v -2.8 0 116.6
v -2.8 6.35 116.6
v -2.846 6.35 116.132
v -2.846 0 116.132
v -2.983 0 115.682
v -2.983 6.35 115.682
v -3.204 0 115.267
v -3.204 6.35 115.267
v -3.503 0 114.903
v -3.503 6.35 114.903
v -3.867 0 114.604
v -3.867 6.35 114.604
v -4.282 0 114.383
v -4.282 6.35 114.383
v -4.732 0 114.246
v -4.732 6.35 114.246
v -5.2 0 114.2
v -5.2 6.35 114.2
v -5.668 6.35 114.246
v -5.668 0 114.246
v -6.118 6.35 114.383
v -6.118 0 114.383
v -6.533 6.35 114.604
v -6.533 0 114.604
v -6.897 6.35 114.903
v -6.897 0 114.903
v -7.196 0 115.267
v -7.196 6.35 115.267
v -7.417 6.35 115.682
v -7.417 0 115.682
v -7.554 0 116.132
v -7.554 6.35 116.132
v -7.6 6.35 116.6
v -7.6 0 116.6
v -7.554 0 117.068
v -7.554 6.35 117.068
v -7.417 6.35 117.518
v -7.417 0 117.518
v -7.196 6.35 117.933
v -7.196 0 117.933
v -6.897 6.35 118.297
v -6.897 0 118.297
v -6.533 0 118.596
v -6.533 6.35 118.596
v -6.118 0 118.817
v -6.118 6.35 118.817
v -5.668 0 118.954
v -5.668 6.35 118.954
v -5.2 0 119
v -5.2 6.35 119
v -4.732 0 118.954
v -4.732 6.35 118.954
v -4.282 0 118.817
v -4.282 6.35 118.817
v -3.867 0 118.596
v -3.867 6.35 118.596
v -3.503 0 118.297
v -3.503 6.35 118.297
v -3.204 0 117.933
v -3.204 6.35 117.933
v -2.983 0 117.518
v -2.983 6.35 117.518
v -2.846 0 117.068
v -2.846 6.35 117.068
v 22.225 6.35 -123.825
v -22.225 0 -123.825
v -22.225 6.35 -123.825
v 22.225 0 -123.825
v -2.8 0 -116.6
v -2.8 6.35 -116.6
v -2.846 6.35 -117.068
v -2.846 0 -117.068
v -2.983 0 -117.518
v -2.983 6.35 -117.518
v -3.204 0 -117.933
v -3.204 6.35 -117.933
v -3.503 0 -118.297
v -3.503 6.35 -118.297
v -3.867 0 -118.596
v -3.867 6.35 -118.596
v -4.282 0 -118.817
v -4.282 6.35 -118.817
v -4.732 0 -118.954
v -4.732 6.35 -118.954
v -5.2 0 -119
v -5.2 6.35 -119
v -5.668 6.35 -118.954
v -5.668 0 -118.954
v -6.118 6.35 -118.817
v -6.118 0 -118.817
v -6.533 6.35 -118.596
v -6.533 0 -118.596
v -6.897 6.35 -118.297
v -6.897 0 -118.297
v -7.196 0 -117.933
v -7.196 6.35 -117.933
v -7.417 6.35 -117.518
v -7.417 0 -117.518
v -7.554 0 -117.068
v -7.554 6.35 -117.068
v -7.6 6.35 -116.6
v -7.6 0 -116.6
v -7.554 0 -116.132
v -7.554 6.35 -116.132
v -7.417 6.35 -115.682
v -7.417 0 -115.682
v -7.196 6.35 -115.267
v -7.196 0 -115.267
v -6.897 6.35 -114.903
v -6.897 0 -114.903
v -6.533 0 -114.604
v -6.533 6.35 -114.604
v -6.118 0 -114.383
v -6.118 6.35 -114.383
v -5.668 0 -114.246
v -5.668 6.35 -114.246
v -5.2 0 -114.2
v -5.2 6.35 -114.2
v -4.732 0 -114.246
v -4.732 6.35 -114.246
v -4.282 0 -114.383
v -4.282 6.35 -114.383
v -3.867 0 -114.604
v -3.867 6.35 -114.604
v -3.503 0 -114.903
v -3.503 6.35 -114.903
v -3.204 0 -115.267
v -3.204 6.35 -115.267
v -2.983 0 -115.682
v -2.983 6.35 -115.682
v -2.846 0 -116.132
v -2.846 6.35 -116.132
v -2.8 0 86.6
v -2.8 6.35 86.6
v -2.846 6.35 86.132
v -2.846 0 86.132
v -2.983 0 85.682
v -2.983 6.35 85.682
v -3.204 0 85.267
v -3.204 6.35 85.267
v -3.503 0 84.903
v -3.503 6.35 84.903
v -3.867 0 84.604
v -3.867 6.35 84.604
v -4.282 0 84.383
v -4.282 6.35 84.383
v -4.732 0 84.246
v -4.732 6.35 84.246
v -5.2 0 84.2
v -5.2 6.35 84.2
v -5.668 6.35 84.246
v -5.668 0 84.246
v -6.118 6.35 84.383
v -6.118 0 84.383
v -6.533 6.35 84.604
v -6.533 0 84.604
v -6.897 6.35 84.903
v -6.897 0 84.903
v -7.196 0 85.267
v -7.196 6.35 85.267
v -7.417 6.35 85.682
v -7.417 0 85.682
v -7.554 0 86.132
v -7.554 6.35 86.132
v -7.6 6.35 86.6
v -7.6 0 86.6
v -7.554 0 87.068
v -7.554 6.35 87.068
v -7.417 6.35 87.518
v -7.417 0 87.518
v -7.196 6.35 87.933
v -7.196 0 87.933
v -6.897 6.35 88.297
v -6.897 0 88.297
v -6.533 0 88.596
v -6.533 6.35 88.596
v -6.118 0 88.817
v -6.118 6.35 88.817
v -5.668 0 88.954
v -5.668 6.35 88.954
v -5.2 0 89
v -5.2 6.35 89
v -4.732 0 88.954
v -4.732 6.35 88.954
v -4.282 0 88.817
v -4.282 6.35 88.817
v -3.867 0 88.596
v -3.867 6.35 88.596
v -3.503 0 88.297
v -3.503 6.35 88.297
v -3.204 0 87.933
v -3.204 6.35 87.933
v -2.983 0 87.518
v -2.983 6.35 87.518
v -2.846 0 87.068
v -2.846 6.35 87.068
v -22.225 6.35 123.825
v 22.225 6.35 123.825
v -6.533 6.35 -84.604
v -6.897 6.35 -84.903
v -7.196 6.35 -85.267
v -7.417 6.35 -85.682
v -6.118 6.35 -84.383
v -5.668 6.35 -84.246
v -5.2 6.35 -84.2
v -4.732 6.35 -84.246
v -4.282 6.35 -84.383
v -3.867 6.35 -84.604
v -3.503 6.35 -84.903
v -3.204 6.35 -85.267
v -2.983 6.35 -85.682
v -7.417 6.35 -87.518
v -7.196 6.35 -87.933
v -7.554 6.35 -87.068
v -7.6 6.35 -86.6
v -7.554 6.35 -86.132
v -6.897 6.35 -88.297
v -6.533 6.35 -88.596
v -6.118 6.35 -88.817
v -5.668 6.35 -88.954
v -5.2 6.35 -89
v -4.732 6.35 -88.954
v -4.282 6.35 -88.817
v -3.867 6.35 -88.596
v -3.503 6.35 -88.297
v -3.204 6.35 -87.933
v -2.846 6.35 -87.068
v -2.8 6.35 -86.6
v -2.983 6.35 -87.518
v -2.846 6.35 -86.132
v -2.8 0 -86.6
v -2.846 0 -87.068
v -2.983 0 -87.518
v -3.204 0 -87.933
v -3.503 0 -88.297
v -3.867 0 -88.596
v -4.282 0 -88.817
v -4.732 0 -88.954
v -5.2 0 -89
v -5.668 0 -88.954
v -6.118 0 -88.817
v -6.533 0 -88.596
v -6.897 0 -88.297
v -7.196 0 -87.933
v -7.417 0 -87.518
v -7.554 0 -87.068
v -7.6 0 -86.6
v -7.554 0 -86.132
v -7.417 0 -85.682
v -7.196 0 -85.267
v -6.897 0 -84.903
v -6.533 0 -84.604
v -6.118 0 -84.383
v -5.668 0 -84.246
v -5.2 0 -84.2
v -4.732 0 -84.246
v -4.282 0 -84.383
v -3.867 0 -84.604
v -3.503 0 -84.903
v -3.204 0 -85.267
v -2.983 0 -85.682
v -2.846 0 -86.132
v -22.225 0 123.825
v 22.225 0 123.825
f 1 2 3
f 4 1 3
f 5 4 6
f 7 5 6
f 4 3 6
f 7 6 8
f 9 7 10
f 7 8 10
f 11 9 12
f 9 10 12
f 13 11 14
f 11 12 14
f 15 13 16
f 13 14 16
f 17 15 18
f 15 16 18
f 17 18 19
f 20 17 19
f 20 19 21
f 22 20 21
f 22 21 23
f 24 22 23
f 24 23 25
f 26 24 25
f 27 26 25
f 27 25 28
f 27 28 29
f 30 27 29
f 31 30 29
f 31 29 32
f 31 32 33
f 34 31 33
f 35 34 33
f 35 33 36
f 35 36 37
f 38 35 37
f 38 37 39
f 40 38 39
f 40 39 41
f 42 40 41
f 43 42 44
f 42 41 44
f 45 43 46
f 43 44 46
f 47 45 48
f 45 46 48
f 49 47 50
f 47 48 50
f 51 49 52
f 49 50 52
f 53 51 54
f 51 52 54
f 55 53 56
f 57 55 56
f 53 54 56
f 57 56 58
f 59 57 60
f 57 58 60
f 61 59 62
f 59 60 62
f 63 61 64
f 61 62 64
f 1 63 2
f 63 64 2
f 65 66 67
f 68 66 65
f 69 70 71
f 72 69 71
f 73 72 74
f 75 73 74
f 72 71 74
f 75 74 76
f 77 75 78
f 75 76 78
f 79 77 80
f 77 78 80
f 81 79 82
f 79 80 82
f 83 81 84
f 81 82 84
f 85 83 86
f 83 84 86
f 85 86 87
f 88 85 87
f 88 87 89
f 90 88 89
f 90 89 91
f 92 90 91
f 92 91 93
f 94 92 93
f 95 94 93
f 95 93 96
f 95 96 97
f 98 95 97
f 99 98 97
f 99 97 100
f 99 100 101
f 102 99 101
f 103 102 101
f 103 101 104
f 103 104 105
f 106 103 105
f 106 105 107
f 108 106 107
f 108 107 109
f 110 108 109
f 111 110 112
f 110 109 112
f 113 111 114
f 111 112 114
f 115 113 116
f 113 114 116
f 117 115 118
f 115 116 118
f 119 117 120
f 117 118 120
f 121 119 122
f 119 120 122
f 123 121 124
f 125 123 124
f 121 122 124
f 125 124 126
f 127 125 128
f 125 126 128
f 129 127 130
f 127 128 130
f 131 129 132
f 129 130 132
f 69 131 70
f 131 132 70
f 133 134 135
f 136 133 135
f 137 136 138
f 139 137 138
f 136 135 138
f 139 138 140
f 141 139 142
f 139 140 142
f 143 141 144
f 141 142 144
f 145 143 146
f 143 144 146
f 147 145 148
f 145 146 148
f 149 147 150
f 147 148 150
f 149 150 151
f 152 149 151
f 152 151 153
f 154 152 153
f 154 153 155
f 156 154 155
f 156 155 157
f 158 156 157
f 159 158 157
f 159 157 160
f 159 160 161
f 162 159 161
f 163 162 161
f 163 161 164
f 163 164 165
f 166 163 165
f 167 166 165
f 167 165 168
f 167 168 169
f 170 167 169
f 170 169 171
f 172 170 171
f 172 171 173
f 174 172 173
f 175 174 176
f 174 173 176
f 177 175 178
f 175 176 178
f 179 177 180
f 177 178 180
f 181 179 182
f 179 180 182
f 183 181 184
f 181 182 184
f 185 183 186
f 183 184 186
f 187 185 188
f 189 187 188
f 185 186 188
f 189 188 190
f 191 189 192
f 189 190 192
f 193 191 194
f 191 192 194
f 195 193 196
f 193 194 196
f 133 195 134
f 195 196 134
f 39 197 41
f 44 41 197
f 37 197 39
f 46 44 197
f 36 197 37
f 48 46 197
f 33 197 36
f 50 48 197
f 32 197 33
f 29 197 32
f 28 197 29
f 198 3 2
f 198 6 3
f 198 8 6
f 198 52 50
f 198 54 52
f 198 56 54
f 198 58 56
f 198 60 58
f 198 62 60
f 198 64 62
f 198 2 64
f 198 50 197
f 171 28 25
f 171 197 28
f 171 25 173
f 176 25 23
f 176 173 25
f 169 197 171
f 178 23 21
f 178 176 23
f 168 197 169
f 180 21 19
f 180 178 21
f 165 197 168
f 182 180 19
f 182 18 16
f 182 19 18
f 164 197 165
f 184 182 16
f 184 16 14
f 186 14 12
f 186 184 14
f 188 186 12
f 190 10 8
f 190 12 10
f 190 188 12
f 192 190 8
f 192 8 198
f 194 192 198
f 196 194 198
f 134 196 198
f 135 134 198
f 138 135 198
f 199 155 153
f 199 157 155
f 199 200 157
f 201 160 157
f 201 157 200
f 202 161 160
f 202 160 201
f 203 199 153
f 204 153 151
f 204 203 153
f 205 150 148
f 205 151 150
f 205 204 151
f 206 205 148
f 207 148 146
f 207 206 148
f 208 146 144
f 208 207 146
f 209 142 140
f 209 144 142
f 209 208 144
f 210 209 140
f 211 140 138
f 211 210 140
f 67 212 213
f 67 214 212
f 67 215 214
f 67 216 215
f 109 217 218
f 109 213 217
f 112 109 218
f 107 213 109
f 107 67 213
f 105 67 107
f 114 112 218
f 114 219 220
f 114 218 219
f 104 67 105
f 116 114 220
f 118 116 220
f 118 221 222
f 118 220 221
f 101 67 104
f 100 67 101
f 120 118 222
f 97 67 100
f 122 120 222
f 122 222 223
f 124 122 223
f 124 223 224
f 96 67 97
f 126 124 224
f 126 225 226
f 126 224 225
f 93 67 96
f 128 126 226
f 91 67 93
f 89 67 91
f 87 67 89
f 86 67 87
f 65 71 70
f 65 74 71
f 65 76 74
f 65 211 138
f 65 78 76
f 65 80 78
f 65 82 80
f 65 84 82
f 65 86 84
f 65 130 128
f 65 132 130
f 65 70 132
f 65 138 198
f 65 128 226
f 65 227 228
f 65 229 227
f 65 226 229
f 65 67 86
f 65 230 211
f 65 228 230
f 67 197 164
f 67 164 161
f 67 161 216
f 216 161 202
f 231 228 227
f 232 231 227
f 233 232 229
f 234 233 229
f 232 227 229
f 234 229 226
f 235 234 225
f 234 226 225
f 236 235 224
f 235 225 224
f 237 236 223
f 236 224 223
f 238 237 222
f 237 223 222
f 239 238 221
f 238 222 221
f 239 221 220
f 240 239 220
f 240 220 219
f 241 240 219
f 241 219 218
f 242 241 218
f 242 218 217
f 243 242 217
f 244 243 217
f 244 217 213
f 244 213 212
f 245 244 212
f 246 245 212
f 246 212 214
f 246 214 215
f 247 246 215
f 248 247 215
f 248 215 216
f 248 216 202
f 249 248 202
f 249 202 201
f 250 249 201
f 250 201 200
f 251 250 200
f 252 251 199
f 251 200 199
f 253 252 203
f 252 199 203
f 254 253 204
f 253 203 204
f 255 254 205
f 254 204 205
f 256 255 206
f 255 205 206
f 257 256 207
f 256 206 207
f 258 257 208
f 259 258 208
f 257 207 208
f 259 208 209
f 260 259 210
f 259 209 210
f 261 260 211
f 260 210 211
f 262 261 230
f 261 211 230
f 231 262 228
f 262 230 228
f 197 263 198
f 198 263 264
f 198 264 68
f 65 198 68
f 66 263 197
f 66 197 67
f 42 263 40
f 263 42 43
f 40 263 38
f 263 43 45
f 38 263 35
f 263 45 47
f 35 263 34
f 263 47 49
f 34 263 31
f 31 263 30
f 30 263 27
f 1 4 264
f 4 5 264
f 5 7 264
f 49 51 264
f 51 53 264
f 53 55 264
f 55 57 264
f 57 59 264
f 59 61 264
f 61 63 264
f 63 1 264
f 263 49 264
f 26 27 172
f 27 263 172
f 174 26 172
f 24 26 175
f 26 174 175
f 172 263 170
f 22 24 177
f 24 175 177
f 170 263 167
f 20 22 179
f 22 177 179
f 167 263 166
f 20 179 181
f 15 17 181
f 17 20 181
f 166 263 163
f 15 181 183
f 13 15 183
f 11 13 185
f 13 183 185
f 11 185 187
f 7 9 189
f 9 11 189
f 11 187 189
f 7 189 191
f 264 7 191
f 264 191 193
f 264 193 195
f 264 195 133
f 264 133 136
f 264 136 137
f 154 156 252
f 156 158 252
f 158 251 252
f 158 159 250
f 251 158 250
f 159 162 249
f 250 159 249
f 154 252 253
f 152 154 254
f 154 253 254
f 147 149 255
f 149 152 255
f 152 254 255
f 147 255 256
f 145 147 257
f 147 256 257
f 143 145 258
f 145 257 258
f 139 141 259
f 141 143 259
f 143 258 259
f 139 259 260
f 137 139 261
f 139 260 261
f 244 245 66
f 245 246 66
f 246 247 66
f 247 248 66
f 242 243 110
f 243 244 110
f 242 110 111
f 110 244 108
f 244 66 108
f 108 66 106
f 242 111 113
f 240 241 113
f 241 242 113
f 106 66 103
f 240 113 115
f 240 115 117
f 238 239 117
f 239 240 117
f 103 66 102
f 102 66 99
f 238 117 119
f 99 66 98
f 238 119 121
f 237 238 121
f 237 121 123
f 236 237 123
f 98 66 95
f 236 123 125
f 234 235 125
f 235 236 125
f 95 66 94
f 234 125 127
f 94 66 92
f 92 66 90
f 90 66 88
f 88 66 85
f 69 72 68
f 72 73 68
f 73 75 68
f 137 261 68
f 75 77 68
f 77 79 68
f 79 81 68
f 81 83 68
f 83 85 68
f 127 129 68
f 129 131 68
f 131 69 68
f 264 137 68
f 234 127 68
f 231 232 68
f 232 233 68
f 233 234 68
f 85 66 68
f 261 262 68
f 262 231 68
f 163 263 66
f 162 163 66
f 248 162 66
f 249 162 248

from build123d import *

# Parameters (mm, degrees)
SKETCH1_W            = 44.45
SKETCH1_H            = 247.65
BOSS_EXTRUDE1_DEPTH  = 6.35
M4_CLEARANCE_HOLE1_D = 4.8


with BuildPart() as part:
    # Sketch1 → Boss-Extrude1 (new body)
    with BuildSketch(Plane(origin=(0, 0, 0), x_dir=(1, 0, 0), z_dir=(0, 1, 0))):
        Rectangle(SKETCH1_W, SKETCH1_H)
    extrude(amount=BOSS_EXTRUDE1_DEPTH)

    # M4 Clearance Hole1 (through all)
    with Locations(Plane(origin=(0, 0, 0), x_dir=(-1, 0, 0), z_dir=(0, -1, 0))):
        with Locations((37.2, -116.6), (5.2, -116.6), (5.2, -86.6), (37.2, -86.6), (37.2, 86.6), (37.2, 116.6), (5.2, 116.6), (5.2, 86.6)):
            Hole(M4_CLEARANCE_HOLE1_D / 2)


solid = part.part
